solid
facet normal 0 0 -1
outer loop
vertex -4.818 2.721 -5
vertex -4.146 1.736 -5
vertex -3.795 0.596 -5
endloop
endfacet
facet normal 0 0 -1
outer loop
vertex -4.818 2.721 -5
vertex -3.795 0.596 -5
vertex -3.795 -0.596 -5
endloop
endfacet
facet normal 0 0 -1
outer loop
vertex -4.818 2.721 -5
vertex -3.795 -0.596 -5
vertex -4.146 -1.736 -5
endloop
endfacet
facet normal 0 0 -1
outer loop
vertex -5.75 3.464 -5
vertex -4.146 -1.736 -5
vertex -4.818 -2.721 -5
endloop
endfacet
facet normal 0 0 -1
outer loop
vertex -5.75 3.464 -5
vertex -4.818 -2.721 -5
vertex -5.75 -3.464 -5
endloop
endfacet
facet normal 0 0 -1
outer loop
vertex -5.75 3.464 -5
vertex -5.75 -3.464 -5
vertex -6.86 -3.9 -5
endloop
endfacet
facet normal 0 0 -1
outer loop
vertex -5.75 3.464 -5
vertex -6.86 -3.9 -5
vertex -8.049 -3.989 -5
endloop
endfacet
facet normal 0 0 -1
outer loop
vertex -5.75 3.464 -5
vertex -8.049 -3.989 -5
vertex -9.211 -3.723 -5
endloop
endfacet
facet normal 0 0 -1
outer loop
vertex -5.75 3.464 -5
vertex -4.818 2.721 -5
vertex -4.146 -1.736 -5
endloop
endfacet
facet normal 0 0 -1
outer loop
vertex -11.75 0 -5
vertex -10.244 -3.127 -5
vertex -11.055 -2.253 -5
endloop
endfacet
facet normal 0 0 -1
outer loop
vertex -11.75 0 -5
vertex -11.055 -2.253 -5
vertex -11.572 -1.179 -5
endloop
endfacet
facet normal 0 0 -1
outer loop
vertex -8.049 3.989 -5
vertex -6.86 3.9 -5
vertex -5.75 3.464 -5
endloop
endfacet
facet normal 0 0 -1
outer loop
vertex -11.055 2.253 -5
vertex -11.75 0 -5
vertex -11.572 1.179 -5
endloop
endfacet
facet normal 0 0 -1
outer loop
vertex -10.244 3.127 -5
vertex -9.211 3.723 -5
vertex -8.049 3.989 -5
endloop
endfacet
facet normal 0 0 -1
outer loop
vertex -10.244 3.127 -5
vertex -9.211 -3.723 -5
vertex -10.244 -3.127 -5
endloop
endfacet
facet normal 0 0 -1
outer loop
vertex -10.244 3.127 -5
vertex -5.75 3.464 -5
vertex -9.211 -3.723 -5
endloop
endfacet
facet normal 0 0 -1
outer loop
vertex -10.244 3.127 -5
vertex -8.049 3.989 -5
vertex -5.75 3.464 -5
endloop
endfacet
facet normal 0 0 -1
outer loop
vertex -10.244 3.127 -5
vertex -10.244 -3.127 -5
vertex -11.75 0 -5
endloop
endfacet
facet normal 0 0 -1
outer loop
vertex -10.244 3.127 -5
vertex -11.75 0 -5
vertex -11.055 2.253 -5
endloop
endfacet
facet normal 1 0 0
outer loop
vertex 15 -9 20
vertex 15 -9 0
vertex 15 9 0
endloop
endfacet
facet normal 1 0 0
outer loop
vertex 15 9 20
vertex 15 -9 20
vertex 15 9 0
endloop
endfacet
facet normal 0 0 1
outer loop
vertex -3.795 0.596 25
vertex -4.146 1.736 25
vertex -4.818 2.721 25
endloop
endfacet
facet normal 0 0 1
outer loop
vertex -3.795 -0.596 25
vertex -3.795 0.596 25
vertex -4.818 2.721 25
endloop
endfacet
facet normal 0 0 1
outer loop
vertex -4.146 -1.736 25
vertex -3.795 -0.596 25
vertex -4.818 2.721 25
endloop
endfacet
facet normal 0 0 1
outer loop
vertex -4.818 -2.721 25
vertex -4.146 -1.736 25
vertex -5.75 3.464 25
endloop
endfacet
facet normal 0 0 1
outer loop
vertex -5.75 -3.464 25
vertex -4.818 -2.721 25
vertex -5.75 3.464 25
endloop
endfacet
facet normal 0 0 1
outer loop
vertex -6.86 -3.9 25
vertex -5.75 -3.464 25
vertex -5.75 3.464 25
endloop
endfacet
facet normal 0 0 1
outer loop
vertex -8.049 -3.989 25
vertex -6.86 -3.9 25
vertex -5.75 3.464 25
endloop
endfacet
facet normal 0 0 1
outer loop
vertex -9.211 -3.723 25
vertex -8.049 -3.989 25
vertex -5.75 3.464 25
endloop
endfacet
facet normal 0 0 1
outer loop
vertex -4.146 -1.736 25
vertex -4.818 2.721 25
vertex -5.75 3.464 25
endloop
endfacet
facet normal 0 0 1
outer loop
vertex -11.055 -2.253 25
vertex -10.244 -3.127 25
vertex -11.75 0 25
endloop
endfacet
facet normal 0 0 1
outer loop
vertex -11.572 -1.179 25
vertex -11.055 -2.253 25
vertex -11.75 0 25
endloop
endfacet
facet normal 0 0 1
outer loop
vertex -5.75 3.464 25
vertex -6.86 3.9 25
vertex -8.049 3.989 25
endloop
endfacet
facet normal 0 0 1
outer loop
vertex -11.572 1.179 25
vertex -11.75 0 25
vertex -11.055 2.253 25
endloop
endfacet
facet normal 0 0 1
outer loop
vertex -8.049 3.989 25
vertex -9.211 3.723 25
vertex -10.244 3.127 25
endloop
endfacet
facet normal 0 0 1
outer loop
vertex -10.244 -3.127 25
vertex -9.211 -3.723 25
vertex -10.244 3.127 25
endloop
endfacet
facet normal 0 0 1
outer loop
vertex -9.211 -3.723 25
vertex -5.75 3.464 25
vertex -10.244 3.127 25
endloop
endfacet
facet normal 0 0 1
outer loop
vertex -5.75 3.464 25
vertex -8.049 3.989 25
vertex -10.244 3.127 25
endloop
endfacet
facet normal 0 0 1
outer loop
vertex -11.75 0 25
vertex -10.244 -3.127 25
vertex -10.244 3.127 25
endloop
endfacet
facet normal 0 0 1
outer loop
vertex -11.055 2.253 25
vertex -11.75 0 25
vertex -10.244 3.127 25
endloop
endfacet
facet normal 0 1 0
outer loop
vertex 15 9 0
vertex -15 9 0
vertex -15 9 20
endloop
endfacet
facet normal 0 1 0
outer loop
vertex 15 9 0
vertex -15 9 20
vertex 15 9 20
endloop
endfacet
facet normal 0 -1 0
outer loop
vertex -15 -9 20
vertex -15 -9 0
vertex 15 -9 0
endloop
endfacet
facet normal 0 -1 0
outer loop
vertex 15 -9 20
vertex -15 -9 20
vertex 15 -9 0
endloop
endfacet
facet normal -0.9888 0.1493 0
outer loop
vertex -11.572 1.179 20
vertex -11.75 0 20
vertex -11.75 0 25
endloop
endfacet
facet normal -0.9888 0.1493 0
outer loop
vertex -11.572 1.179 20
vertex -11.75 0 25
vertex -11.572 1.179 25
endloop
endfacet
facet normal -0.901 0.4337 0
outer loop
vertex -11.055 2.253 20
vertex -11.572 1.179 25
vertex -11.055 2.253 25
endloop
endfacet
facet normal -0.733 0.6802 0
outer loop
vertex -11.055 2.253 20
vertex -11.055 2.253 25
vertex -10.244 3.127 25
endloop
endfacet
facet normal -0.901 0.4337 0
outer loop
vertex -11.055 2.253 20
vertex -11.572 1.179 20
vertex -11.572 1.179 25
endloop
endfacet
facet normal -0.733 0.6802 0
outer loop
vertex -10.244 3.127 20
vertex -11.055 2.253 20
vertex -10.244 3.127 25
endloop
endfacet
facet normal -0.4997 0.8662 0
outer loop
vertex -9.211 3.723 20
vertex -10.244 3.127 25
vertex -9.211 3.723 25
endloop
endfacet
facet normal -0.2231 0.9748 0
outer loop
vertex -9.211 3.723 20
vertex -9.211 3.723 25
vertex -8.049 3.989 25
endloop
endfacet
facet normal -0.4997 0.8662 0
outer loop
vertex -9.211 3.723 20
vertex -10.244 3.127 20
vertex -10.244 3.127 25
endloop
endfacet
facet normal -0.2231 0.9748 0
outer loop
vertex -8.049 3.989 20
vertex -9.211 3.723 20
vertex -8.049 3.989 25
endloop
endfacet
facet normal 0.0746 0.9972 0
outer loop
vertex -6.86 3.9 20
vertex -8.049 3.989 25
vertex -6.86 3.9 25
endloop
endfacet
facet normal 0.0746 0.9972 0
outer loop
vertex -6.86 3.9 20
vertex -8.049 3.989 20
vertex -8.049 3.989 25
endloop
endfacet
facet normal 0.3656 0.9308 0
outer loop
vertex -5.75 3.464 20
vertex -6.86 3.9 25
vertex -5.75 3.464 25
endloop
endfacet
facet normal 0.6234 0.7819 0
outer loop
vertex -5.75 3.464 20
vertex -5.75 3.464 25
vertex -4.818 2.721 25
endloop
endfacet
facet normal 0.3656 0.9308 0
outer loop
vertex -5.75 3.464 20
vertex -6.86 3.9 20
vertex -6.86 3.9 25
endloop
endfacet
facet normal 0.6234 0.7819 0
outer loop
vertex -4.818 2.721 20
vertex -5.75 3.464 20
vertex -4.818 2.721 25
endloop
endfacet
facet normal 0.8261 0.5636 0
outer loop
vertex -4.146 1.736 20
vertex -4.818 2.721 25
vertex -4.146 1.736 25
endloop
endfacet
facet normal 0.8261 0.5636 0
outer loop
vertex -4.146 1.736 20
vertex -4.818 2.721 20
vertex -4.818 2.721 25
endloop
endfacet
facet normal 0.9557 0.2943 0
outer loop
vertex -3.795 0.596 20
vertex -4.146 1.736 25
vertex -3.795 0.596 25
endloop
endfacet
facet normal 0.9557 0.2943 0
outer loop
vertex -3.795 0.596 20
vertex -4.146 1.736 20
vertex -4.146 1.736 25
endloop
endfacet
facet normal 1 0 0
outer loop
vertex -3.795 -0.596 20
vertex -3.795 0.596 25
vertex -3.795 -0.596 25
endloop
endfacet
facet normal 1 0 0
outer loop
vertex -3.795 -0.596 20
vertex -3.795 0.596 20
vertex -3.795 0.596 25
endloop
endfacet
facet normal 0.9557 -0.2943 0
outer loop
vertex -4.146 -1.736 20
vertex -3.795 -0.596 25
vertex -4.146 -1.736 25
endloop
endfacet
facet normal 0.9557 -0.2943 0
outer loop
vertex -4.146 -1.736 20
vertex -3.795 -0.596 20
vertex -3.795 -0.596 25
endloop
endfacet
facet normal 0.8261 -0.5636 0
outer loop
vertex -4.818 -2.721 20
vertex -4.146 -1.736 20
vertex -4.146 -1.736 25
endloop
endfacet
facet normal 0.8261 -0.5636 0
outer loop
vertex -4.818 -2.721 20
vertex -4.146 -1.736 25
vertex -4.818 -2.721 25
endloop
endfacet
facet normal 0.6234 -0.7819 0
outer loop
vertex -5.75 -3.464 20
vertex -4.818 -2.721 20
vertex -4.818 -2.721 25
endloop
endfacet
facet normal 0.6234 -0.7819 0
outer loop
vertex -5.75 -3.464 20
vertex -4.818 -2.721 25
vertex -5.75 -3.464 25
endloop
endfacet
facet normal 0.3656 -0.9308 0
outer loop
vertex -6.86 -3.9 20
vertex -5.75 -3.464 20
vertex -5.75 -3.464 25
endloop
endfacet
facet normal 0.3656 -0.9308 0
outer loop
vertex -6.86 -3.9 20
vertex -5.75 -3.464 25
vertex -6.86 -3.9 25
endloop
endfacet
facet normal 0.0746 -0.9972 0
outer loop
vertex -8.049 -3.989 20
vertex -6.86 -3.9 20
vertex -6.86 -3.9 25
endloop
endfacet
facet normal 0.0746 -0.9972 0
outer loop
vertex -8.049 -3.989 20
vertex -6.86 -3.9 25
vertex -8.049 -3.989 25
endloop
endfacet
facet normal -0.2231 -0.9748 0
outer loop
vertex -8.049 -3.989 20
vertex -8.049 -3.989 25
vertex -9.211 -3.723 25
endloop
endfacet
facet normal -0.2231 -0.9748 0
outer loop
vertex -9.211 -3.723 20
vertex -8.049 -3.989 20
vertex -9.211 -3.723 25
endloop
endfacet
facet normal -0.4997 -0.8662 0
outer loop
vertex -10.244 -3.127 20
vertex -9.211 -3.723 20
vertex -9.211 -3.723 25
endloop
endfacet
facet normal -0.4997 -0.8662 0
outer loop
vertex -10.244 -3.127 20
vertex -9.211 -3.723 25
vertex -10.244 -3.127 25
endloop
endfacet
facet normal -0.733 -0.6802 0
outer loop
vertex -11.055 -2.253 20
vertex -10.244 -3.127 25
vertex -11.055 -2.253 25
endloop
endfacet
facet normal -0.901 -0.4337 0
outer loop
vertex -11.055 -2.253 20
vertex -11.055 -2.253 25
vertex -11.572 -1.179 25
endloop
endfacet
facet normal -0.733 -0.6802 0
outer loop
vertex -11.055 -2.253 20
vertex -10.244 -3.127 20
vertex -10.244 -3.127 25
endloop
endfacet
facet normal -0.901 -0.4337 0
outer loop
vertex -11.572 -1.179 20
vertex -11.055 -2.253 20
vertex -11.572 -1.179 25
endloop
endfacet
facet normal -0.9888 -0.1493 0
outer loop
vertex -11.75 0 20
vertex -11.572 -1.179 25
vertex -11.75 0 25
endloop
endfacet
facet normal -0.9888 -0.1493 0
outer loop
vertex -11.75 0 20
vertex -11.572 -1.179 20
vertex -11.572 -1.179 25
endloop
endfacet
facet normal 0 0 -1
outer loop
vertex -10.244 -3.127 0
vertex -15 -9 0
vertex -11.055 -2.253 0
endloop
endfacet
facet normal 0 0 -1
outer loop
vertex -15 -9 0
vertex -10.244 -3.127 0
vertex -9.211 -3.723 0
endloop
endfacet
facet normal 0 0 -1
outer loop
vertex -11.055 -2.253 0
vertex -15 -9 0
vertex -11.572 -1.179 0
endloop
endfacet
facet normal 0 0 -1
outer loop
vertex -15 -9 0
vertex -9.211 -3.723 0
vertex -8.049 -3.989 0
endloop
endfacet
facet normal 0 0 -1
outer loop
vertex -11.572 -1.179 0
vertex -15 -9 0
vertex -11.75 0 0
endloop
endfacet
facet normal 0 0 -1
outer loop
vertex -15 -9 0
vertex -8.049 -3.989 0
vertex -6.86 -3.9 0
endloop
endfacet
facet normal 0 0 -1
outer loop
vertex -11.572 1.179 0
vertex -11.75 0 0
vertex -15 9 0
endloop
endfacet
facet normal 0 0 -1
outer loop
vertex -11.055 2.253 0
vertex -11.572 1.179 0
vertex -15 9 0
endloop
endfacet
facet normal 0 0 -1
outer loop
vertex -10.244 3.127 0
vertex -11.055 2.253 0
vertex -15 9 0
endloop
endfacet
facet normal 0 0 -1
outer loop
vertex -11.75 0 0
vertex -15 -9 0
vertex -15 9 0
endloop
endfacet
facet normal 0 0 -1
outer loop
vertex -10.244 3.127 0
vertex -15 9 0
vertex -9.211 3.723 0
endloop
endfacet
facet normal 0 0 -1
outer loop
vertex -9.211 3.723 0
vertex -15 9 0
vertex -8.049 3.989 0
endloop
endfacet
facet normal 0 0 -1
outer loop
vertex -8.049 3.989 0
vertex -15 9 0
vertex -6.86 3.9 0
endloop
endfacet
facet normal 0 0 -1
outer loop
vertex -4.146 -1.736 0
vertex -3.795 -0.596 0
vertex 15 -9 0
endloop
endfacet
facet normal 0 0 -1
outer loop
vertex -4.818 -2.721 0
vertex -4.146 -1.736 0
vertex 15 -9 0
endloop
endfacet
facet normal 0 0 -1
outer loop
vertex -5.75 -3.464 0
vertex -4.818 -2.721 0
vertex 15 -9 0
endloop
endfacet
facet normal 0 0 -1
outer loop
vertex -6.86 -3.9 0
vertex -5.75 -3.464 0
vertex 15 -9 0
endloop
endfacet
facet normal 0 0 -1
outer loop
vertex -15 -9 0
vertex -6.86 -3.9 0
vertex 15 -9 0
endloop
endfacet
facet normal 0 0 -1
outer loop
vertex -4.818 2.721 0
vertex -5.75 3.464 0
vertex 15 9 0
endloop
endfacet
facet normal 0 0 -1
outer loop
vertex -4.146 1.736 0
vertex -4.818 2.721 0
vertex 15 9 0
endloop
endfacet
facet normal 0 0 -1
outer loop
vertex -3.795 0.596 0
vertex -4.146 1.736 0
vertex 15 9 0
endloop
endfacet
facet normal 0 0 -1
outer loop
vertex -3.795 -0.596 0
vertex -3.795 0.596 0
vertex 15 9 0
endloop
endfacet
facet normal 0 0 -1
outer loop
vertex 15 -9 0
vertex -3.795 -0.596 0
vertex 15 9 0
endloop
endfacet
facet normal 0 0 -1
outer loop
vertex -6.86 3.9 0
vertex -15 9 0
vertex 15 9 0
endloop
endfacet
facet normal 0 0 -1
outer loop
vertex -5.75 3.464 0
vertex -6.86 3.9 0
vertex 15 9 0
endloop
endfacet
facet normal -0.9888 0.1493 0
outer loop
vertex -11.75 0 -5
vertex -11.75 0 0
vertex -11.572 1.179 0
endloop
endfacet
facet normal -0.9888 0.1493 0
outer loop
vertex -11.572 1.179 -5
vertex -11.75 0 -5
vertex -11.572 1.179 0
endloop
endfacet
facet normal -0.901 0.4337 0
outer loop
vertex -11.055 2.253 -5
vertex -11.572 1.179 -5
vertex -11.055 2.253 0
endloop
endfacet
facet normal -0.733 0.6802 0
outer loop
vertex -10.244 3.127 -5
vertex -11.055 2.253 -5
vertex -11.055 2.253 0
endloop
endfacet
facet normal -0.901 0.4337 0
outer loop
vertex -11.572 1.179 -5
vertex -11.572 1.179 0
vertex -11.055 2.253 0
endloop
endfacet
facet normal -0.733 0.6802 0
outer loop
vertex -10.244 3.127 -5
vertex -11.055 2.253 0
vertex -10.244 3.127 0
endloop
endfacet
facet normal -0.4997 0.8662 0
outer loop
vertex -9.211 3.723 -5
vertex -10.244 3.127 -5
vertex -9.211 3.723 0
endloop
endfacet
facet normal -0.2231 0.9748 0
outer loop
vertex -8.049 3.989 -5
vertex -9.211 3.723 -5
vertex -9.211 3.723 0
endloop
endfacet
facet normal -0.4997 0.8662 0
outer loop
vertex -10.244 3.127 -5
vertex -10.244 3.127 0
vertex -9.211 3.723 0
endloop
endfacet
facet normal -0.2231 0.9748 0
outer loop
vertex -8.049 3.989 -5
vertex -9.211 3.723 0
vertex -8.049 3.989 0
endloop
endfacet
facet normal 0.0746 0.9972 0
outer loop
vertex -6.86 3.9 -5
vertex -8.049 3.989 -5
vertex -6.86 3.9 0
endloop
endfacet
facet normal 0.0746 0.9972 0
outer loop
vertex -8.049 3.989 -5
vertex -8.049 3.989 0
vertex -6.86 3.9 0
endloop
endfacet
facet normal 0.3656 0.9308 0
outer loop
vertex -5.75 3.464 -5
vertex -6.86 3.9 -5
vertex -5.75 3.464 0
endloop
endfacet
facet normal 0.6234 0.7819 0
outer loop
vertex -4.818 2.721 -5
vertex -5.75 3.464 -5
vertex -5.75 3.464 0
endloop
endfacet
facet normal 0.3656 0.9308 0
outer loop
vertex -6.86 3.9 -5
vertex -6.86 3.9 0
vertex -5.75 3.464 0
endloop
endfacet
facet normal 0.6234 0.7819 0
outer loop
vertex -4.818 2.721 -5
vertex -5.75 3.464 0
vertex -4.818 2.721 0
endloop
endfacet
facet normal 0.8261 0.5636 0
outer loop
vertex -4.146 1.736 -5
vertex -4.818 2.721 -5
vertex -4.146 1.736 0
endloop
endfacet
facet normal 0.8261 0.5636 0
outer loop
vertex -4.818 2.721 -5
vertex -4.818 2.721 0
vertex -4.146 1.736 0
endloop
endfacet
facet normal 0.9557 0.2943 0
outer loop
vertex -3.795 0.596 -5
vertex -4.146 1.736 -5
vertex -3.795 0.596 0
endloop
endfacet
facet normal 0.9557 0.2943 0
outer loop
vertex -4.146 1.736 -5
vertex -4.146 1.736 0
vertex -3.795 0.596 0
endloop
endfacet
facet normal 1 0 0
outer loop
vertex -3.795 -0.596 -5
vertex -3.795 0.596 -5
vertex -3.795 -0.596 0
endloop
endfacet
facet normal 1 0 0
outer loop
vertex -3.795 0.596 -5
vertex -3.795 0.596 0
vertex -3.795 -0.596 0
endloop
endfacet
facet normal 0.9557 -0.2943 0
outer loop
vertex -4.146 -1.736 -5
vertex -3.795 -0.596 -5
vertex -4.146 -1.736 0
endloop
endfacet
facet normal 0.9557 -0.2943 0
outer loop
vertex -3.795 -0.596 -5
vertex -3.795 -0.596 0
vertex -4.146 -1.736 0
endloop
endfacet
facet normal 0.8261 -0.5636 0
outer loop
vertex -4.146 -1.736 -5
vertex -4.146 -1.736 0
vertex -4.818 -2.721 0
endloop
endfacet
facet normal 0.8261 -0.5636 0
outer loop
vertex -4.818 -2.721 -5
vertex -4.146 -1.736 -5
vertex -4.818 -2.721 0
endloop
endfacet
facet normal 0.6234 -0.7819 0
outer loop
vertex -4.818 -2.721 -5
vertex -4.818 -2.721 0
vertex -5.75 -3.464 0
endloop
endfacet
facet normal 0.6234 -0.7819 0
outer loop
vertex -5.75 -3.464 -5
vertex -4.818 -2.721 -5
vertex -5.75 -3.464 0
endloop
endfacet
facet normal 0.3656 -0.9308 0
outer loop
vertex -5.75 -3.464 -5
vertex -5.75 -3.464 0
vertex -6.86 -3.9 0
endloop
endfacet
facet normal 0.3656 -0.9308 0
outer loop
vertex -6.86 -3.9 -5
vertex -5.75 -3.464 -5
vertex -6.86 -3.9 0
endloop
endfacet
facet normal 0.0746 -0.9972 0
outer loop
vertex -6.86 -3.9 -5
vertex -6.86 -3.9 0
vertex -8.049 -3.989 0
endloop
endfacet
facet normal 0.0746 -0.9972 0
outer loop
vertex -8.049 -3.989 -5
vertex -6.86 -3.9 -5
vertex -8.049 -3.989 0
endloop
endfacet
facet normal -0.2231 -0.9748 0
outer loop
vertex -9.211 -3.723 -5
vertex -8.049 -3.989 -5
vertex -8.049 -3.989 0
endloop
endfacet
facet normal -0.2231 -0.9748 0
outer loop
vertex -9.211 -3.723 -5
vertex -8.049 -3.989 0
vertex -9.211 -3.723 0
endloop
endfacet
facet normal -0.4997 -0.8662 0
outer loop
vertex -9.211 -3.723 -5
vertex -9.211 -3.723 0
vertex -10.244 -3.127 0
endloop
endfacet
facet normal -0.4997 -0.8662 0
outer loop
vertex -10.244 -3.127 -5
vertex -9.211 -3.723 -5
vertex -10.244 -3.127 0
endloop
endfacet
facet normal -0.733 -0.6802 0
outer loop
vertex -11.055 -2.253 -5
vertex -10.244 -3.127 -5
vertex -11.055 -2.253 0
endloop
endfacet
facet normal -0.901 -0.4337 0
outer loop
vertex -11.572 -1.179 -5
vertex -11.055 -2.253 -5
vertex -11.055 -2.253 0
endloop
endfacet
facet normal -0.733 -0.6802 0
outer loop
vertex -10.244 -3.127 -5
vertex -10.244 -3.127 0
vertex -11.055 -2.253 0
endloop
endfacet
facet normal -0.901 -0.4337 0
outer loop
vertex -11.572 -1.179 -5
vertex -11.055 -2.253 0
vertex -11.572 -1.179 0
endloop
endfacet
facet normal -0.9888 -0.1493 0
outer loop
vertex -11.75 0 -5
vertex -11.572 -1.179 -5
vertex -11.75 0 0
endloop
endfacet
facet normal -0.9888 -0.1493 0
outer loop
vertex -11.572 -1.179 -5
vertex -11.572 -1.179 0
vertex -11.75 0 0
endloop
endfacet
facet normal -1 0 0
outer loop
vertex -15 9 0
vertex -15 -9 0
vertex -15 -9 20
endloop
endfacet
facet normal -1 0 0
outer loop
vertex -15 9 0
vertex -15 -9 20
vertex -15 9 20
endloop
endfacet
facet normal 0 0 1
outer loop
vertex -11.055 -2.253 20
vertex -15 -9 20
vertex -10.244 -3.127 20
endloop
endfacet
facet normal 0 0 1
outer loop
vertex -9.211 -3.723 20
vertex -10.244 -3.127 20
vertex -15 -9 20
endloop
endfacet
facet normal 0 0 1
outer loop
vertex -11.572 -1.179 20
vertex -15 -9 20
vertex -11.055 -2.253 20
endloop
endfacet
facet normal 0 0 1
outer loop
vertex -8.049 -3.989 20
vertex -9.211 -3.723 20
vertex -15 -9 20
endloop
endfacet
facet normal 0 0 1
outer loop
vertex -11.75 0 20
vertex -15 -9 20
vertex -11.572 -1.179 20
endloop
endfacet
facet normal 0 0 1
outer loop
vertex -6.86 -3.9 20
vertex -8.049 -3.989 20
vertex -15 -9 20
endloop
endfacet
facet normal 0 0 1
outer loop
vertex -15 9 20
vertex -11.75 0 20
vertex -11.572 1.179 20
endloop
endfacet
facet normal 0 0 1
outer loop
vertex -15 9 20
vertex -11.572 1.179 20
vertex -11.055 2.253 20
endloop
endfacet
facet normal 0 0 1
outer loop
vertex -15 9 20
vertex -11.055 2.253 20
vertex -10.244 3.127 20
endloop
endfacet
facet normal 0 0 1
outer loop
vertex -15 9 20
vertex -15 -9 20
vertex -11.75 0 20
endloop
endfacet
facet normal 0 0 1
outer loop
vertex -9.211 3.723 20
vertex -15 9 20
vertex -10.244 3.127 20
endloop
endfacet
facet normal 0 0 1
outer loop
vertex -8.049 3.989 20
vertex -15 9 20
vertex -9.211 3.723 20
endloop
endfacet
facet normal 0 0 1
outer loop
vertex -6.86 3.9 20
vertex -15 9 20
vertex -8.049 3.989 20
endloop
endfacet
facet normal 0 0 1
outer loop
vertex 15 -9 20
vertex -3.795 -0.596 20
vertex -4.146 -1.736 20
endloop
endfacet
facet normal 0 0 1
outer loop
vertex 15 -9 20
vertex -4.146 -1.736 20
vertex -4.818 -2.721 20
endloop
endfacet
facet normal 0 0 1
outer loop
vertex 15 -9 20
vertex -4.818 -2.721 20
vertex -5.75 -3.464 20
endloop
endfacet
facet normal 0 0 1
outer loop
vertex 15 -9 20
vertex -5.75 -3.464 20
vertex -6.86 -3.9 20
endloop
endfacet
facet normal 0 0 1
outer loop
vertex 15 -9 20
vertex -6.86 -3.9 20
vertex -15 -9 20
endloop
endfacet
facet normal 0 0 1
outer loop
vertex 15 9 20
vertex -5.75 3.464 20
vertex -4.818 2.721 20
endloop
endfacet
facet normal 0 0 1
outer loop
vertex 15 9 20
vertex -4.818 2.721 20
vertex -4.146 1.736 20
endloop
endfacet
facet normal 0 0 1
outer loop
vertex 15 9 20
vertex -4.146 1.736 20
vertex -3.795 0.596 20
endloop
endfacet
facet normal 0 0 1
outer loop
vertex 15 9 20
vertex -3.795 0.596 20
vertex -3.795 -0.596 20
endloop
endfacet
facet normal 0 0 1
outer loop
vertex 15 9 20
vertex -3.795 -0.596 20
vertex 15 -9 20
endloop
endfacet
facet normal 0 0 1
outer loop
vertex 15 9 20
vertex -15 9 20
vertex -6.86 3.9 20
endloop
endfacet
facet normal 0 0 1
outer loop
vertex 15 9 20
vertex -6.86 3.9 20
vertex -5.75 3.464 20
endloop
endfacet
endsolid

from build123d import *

# Parameters (mm, degrees)
ESQUISSE1_W        = 30
ESQUISSE1_H        = 18
BOSS_EXTRU_1_DEPTH = 20
ESQUISSE2_R        = 4
BOSS_EXTRU_2_DEPTH = 5


with BuildPart() as part:
    # Esquisse1 → Boss.-Extru.1 (new body)
    with BuildSketch(Plane.XY):
        Rectangle(ESQUISSE1_W, ESQUISSE1_H)
    extrude(amount=BOSS_EXTRU_1_DEPTH)

    # Esquisse2 → Boss.-Extru.2 (add)
    with BuildSketch(Plane(origin=(0, 0, 0), x_dir=(-1, 0, 0), z_dir=(0, 0, -1))):
        with Locations((7.75, 0)):
            Circle(ESQUISSE2_R)
    boss_extru_2 = extrude(amount=BOSS_EXTRU_2_DEPTH)

    # Symétrie1: Boss.-Extru.2 across plane
    add(boss_extru_2.mirror(Plane.XY.offset(10)))


solid = part.part
